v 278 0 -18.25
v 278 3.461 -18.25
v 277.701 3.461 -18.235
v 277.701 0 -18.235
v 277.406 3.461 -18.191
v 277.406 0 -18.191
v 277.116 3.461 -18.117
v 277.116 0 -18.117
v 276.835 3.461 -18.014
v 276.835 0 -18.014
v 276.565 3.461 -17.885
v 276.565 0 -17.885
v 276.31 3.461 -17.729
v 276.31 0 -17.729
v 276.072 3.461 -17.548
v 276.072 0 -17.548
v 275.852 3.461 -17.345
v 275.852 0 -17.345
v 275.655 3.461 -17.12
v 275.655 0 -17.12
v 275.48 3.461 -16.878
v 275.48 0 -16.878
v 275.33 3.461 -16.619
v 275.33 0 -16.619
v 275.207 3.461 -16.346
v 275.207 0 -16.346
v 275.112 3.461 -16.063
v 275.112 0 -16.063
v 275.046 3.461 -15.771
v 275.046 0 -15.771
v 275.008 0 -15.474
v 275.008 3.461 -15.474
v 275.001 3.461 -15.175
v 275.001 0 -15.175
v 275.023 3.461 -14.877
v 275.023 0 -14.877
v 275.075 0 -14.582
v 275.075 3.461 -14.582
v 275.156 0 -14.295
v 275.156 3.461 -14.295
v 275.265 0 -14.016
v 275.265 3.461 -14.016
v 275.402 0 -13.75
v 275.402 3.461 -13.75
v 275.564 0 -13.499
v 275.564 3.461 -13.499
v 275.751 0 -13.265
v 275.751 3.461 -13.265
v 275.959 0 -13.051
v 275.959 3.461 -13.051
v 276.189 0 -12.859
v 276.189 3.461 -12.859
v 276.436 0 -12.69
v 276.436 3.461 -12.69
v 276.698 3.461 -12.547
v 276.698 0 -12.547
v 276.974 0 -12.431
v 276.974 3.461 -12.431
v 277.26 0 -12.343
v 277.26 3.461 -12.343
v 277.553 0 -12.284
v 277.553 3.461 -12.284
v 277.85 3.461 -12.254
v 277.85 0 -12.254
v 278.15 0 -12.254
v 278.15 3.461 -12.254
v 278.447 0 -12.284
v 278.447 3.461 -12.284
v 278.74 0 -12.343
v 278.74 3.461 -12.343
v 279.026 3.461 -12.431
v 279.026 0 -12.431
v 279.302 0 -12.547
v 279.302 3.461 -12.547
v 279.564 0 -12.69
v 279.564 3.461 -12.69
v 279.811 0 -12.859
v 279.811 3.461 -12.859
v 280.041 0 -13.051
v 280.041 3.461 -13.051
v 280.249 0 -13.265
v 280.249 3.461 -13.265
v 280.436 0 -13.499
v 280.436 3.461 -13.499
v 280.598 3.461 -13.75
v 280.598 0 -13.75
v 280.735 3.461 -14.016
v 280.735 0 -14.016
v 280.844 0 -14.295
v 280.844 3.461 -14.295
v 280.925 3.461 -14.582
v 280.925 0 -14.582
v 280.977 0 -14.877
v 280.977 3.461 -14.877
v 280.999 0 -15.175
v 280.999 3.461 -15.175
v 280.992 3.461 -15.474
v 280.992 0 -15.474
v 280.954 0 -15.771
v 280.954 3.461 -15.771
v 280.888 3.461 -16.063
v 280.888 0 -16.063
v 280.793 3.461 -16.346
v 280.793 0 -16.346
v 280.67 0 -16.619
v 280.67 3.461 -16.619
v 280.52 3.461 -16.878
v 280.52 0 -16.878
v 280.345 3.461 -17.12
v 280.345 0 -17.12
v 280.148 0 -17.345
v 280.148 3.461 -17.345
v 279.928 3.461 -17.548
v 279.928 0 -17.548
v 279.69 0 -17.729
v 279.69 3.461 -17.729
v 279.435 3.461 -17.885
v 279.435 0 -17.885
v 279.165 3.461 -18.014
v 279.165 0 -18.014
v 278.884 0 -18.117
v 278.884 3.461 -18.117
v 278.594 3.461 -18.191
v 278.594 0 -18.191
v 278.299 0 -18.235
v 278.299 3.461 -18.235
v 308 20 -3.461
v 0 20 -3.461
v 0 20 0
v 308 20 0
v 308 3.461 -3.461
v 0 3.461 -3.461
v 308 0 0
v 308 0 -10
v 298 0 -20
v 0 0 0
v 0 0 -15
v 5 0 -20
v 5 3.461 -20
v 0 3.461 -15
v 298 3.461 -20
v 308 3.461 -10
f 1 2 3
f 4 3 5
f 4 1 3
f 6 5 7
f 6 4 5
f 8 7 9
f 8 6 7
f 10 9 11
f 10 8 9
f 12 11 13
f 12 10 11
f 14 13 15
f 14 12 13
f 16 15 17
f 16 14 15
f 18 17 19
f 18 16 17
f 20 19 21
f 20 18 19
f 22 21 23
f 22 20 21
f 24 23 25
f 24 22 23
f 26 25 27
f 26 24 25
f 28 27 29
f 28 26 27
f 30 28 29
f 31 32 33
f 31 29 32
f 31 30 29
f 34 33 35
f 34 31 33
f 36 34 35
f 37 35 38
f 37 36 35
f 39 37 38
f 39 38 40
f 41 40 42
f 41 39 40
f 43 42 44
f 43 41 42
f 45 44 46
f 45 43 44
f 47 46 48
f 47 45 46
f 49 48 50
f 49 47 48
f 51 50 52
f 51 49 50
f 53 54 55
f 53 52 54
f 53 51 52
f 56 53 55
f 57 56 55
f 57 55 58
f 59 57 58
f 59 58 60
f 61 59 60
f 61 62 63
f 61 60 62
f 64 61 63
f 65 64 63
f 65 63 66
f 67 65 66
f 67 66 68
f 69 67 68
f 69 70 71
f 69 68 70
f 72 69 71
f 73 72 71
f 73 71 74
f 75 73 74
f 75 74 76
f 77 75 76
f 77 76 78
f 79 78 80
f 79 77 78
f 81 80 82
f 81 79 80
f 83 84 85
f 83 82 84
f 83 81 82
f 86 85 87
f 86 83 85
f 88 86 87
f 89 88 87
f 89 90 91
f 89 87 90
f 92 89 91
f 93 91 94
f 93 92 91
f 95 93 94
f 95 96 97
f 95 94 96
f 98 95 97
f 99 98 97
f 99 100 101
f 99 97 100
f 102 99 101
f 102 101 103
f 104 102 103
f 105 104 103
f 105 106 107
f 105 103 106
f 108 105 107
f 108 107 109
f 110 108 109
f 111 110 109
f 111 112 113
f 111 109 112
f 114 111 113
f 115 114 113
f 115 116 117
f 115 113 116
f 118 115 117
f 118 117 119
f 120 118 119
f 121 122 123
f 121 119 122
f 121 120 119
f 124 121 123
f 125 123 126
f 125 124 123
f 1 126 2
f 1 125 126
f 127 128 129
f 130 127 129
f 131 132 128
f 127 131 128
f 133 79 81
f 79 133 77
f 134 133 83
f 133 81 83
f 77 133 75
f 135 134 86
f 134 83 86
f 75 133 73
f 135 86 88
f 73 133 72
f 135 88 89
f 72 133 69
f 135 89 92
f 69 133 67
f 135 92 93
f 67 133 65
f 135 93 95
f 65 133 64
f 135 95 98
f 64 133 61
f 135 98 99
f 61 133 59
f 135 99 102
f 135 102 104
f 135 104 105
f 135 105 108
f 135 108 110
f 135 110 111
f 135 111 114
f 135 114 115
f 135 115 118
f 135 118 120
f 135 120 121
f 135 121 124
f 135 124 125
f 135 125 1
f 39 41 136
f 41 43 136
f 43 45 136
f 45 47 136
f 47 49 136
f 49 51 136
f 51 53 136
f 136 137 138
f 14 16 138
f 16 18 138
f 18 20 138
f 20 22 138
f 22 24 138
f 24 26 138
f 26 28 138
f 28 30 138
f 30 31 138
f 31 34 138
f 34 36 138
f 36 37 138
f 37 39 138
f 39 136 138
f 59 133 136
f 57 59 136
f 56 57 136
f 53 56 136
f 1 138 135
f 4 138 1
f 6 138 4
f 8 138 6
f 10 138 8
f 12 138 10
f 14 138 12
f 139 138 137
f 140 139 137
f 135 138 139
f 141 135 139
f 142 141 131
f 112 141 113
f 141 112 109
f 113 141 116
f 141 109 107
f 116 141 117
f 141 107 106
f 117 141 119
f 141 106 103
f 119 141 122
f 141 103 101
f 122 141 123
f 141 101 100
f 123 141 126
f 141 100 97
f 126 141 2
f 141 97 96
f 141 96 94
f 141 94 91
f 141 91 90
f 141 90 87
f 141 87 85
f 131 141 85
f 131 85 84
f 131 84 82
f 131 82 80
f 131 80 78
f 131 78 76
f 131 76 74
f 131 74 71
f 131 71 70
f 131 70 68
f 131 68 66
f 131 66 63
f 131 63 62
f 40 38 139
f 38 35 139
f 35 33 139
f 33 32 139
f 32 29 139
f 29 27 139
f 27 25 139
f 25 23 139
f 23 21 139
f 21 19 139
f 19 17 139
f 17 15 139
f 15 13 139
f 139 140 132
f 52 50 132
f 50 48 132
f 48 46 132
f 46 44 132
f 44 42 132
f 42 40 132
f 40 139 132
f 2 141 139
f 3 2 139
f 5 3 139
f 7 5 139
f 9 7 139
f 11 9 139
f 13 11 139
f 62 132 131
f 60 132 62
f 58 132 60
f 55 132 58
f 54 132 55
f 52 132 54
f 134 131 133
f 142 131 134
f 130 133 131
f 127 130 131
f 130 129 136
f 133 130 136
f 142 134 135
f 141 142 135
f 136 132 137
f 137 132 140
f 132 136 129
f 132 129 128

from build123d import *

# Parameters (mm, degrees)
BOSS_EXTRUDE1_DEPTH = 308
SKETCH2_R           = 3
CUT_EXTRUDE1_DEPTH  = 310.295974756


with BuildPart() as part:
    # Sketch1 → Boss-Extrude1 (new body)
    with BuildSketch(Plane(origin=(0, 0, 0), x_dir=(0, 0, -1), z_dir=(1, 0, 0))):
        Polygon((0, 0), (20, 0), (20, 3.461178467), (3.461178467, 3.461178467), (3.461178467, 20), (0, 20), align=None)
    extrude(amount=BOSS_EXTRUDE1_DEPTH)

    # Sketch2 → Cut-Extrude1 (cut, through all)
    with BuildSketch(Plane(origin=(0, 0, 0), x_dir=(1, 0, 0), z_dir=(0, 1, 0))):
        with Locations(Location((278, 15.25, 0), (0, 0, 90))):
            Circle(SKETCH2_R)
        Polygon((308, 10), (298, 20), (308, 20), align=None)
        Polygon((0, 20), (5, 20), (0, 15), align=None)
    extrude(amount=CUT_EXTRUDE1_DEPTH, mode=Mode.SUBTRACT)


solid = part.part
